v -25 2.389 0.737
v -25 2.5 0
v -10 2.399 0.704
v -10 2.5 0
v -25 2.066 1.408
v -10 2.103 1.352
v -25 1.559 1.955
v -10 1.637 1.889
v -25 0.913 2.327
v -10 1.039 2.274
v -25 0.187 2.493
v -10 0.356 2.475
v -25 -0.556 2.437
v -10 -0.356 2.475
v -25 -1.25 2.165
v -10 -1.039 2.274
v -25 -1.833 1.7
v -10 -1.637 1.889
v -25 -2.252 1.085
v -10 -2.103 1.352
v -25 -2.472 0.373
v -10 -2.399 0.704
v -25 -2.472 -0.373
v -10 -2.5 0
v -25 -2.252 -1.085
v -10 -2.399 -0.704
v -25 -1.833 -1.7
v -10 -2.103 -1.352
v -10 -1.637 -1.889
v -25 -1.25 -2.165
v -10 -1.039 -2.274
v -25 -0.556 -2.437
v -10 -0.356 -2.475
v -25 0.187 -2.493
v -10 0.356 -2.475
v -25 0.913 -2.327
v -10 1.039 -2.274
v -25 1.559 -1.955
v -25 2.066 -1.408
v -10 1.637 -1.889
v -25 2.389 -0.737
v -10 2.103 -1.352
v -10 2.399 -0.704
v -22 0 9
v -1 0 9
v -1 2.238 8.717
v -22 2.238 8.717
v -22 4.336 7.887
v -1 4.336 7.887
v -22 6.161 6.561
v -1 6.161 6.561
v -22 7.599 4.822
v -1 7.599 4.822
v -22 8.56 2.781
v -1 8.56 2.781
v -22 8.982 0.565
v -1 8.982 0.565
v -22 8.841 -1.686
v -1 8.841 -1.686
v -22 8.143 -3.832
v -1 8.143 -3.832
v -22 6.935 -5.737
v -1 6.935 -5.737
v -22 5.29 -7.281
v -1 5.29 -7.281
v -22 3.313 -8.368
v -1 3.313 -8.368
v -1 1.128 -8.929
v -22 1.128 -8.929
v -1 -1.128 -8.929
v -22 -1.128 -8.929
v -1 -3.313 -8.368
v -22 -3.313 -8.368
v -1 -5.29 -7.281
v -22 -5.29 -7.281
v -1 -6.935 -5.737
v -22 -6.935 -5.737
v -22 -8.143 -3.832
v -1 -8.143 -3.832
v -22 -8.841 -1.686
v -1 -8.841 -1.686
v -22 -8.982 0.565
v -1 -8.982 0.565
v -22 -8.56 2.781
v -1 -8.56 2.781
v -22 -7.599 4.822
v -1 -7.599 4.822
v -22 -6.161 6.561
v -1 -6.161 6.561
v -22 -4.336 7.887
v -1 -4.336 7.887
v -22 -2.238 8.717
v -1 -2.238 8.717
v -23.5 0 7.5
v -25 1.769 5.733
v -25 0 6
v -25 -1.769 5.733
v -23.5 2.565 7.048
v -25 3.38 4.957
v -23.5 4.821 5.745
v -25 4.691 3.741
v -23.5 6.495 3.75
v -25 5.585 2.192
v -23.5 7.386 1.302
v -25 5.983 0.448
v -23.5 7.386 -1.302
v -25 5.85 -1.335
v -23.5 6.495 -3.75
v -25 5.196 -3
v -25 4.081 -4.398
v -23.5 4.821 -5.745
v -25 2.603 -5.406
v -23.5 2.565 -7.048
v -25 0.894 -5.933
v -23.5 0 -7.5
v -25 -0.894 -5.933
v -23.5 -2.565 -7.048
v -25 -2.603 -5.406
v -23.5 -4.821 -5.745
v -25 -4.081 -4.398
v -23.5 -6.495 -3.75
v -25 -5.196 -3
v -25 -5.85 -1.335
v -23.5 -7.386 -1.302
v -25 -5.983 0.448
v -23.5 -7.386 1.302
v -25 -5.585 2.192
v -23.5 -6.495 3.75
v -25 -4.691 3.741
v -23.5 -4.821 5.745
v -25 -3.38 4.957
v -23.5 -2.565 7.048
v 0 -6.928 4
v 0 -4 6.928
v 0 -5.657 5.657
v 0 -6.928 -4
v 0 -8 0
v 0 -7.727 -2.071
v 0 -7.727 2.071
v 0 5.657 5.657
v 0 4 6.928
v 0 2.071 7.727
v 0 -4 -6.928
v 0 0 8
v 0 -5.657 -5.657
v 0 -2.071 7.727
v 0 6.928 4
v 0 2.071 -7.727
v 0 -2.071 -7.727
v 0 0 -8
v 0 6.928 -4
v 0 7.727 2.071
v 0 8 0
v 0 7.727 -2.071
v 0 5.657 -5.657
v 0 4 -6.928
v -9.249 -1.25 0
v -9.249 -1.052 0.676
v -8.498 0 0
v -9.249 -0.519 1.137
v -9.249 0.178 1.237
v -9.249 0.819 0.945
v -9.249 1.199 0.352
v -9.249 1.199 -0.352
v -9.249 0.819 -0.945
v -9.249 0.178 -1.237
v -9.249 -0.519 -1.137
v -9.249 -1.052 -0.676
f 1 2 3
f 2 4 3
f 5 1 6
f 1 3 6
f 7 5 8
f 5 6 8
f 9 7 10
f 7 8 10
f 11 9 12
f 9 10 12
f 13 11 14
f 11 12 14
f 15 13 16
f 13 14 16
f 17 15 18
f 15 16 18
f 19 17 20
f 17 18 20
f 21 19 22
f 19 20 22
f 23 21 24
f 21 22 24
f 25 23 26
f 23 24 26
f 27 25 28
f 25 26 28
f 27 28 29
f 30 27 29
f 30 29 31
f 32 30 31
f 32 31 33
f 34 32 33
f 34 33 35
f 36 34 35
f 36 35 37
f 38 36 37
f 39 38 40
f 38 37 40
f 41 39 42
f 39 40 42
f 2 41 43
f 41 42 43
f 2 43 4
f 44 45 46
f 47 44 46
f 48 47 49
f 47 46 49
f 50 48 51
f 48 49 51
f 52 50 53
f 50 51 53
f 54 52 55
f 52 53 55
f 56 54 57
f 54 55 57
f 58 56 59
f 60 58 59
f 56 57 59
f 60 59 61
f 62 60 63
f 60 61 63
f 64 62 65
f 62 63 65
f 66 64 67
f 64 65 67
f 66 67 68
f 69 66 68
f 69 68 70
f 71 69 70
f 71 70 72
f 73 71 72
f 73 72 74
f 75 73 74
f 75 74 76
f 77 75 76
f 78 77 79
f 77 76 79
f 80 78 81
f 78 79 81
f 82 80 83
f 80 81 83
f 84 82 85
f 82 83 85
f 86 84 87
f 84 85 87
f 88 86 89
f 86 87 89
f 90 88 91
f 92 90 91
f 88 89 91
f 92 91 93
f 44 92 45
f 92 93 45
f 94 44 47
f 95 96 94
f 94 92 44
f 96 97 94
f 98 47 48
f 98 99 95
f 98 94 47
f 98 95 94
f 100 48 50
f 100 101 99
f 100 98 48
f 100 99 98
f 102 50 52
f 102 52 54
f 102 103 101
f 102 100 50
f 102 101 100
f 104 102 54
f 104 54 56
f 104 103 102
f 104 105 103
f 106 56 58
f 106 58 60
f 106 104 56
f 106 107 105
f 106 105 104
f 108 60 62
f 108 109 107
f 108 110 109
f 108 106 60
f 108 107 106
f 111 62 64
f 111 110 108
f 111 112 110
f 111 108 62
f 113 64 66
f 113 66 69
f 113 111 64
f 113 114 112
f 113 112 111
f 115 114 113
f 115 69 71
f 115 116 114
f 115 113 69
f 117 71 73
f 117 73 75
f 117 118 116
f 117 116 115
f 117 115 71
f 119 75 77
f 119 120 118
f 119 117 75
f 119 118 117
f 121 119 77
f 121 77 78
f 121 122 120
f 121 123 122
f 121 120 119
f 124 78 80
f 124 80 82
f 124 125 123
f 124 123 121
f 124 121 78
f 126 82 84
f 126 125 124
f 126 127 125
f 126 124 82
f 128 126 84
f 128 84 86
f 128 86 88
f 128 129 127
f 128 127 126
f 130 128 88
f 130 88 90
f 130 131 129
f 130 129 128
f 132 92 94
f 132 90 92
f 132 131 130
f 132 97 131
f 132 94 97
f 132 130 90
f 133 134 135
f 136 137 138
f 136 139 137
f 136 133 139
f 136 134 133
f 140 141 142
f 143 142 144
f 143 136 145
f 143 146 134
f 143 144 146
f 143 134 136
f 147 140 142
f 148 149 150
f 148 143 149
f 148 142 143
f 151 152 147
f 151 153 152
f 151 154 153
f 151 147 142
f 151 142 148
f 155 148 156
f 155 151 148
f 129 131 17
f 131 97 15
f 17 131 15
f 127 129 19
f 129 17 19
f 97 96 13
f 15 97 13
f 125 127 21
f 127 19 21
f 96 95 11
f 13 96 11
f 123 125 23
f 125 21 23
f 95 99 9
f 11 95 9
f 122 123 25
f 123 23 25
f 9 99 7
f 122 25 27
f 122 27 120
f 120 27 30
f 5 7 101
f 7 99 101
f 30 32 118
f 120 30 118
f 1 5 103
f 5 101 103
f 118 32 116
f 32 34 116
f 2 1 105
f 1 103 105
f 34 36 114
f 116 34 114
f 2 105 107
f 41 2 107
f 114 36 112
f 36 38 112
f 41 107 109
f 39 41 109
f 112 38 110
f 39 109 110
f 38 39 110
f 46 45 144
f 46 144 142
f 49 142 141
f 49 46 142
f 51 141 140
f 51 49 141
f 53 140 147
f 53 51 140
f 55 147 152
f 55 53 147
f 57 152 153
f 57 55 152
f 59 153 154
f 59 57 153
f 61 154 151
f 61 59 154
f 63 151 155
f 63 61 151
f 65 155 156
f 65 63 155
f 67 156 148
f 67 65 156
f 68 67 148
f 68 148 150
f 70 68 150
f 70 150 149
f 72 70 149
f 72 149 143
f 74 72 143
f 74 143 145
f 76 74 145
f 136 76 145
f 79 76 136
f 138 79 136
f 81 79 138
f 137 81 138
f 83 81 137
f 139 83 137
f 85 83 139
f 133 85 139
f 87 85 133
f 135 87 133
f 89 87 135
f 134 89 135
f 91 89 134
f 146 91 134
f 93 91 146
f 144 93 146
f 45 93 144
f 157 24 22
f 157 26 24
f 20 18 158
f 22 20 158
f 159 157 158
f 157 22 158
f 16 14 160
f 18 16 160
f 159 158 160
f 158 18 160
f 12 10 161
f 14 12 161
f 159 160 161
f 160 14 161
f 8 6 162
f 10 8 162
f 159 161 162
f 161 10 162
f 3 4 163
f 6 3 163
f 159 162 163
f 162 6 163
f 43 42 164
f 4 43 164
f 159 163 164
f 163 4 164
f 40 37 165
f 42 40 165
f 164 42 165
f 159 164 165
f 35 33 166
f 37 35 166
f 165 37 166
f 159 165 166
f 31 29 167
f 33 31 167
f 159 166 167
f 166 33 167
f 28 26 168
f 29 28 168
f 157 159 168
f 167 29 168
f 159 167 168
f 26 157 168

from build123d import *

# Parameters (mm, degrees)
F0_W     = 25
F0_H     = 9
F2_SIZE  = 1
F3_SIZE  = 3
F5_D     = 5
F5_DEPTH = 15
F5_TIP   = 1.5021515476


with BuildPart() as f1:
    # F0 (on Front) → F1 (revolve)
    with BuildSketch(Plane.XZ):
        with Locations((-12.5, 4.5)):
            Rectangle(F0_W, F0_H)
    revolve(axis=Axis((-12.5, 0, 0), (-1, 0, 0)))

    # F2
    f2_edges = [f1.edges().sort_by_distance(p)[0] for p in [
        (0, 0, -9),
    ]]
    chamfer(f2_edges, length=F2_SIZE)

    # F3
    f3_edges = [f1.edges().sort_by_distance(p)[0] for p in [
        (-25, 0, -9),
    ]]
    chamfer(f3_edges, length=F3_SIZE)

    # F5
    with Locations(Plane(origin=(-25, 0, 0), x_dir=(0, -1, 0), z_dir=(-1, 0, 0))):
        with Locations((0, 0)):
            Hole(F5_D / 2, depth=F5_DEPTH)
            with Locations((0, 0, -(F5_DEPTH + F5_TIP / 2))):  # 118° drill point
                Cone(0, F5_D / 2, F5_TIP, mode=Mode.SUBTRACT)


solid = f1.part
